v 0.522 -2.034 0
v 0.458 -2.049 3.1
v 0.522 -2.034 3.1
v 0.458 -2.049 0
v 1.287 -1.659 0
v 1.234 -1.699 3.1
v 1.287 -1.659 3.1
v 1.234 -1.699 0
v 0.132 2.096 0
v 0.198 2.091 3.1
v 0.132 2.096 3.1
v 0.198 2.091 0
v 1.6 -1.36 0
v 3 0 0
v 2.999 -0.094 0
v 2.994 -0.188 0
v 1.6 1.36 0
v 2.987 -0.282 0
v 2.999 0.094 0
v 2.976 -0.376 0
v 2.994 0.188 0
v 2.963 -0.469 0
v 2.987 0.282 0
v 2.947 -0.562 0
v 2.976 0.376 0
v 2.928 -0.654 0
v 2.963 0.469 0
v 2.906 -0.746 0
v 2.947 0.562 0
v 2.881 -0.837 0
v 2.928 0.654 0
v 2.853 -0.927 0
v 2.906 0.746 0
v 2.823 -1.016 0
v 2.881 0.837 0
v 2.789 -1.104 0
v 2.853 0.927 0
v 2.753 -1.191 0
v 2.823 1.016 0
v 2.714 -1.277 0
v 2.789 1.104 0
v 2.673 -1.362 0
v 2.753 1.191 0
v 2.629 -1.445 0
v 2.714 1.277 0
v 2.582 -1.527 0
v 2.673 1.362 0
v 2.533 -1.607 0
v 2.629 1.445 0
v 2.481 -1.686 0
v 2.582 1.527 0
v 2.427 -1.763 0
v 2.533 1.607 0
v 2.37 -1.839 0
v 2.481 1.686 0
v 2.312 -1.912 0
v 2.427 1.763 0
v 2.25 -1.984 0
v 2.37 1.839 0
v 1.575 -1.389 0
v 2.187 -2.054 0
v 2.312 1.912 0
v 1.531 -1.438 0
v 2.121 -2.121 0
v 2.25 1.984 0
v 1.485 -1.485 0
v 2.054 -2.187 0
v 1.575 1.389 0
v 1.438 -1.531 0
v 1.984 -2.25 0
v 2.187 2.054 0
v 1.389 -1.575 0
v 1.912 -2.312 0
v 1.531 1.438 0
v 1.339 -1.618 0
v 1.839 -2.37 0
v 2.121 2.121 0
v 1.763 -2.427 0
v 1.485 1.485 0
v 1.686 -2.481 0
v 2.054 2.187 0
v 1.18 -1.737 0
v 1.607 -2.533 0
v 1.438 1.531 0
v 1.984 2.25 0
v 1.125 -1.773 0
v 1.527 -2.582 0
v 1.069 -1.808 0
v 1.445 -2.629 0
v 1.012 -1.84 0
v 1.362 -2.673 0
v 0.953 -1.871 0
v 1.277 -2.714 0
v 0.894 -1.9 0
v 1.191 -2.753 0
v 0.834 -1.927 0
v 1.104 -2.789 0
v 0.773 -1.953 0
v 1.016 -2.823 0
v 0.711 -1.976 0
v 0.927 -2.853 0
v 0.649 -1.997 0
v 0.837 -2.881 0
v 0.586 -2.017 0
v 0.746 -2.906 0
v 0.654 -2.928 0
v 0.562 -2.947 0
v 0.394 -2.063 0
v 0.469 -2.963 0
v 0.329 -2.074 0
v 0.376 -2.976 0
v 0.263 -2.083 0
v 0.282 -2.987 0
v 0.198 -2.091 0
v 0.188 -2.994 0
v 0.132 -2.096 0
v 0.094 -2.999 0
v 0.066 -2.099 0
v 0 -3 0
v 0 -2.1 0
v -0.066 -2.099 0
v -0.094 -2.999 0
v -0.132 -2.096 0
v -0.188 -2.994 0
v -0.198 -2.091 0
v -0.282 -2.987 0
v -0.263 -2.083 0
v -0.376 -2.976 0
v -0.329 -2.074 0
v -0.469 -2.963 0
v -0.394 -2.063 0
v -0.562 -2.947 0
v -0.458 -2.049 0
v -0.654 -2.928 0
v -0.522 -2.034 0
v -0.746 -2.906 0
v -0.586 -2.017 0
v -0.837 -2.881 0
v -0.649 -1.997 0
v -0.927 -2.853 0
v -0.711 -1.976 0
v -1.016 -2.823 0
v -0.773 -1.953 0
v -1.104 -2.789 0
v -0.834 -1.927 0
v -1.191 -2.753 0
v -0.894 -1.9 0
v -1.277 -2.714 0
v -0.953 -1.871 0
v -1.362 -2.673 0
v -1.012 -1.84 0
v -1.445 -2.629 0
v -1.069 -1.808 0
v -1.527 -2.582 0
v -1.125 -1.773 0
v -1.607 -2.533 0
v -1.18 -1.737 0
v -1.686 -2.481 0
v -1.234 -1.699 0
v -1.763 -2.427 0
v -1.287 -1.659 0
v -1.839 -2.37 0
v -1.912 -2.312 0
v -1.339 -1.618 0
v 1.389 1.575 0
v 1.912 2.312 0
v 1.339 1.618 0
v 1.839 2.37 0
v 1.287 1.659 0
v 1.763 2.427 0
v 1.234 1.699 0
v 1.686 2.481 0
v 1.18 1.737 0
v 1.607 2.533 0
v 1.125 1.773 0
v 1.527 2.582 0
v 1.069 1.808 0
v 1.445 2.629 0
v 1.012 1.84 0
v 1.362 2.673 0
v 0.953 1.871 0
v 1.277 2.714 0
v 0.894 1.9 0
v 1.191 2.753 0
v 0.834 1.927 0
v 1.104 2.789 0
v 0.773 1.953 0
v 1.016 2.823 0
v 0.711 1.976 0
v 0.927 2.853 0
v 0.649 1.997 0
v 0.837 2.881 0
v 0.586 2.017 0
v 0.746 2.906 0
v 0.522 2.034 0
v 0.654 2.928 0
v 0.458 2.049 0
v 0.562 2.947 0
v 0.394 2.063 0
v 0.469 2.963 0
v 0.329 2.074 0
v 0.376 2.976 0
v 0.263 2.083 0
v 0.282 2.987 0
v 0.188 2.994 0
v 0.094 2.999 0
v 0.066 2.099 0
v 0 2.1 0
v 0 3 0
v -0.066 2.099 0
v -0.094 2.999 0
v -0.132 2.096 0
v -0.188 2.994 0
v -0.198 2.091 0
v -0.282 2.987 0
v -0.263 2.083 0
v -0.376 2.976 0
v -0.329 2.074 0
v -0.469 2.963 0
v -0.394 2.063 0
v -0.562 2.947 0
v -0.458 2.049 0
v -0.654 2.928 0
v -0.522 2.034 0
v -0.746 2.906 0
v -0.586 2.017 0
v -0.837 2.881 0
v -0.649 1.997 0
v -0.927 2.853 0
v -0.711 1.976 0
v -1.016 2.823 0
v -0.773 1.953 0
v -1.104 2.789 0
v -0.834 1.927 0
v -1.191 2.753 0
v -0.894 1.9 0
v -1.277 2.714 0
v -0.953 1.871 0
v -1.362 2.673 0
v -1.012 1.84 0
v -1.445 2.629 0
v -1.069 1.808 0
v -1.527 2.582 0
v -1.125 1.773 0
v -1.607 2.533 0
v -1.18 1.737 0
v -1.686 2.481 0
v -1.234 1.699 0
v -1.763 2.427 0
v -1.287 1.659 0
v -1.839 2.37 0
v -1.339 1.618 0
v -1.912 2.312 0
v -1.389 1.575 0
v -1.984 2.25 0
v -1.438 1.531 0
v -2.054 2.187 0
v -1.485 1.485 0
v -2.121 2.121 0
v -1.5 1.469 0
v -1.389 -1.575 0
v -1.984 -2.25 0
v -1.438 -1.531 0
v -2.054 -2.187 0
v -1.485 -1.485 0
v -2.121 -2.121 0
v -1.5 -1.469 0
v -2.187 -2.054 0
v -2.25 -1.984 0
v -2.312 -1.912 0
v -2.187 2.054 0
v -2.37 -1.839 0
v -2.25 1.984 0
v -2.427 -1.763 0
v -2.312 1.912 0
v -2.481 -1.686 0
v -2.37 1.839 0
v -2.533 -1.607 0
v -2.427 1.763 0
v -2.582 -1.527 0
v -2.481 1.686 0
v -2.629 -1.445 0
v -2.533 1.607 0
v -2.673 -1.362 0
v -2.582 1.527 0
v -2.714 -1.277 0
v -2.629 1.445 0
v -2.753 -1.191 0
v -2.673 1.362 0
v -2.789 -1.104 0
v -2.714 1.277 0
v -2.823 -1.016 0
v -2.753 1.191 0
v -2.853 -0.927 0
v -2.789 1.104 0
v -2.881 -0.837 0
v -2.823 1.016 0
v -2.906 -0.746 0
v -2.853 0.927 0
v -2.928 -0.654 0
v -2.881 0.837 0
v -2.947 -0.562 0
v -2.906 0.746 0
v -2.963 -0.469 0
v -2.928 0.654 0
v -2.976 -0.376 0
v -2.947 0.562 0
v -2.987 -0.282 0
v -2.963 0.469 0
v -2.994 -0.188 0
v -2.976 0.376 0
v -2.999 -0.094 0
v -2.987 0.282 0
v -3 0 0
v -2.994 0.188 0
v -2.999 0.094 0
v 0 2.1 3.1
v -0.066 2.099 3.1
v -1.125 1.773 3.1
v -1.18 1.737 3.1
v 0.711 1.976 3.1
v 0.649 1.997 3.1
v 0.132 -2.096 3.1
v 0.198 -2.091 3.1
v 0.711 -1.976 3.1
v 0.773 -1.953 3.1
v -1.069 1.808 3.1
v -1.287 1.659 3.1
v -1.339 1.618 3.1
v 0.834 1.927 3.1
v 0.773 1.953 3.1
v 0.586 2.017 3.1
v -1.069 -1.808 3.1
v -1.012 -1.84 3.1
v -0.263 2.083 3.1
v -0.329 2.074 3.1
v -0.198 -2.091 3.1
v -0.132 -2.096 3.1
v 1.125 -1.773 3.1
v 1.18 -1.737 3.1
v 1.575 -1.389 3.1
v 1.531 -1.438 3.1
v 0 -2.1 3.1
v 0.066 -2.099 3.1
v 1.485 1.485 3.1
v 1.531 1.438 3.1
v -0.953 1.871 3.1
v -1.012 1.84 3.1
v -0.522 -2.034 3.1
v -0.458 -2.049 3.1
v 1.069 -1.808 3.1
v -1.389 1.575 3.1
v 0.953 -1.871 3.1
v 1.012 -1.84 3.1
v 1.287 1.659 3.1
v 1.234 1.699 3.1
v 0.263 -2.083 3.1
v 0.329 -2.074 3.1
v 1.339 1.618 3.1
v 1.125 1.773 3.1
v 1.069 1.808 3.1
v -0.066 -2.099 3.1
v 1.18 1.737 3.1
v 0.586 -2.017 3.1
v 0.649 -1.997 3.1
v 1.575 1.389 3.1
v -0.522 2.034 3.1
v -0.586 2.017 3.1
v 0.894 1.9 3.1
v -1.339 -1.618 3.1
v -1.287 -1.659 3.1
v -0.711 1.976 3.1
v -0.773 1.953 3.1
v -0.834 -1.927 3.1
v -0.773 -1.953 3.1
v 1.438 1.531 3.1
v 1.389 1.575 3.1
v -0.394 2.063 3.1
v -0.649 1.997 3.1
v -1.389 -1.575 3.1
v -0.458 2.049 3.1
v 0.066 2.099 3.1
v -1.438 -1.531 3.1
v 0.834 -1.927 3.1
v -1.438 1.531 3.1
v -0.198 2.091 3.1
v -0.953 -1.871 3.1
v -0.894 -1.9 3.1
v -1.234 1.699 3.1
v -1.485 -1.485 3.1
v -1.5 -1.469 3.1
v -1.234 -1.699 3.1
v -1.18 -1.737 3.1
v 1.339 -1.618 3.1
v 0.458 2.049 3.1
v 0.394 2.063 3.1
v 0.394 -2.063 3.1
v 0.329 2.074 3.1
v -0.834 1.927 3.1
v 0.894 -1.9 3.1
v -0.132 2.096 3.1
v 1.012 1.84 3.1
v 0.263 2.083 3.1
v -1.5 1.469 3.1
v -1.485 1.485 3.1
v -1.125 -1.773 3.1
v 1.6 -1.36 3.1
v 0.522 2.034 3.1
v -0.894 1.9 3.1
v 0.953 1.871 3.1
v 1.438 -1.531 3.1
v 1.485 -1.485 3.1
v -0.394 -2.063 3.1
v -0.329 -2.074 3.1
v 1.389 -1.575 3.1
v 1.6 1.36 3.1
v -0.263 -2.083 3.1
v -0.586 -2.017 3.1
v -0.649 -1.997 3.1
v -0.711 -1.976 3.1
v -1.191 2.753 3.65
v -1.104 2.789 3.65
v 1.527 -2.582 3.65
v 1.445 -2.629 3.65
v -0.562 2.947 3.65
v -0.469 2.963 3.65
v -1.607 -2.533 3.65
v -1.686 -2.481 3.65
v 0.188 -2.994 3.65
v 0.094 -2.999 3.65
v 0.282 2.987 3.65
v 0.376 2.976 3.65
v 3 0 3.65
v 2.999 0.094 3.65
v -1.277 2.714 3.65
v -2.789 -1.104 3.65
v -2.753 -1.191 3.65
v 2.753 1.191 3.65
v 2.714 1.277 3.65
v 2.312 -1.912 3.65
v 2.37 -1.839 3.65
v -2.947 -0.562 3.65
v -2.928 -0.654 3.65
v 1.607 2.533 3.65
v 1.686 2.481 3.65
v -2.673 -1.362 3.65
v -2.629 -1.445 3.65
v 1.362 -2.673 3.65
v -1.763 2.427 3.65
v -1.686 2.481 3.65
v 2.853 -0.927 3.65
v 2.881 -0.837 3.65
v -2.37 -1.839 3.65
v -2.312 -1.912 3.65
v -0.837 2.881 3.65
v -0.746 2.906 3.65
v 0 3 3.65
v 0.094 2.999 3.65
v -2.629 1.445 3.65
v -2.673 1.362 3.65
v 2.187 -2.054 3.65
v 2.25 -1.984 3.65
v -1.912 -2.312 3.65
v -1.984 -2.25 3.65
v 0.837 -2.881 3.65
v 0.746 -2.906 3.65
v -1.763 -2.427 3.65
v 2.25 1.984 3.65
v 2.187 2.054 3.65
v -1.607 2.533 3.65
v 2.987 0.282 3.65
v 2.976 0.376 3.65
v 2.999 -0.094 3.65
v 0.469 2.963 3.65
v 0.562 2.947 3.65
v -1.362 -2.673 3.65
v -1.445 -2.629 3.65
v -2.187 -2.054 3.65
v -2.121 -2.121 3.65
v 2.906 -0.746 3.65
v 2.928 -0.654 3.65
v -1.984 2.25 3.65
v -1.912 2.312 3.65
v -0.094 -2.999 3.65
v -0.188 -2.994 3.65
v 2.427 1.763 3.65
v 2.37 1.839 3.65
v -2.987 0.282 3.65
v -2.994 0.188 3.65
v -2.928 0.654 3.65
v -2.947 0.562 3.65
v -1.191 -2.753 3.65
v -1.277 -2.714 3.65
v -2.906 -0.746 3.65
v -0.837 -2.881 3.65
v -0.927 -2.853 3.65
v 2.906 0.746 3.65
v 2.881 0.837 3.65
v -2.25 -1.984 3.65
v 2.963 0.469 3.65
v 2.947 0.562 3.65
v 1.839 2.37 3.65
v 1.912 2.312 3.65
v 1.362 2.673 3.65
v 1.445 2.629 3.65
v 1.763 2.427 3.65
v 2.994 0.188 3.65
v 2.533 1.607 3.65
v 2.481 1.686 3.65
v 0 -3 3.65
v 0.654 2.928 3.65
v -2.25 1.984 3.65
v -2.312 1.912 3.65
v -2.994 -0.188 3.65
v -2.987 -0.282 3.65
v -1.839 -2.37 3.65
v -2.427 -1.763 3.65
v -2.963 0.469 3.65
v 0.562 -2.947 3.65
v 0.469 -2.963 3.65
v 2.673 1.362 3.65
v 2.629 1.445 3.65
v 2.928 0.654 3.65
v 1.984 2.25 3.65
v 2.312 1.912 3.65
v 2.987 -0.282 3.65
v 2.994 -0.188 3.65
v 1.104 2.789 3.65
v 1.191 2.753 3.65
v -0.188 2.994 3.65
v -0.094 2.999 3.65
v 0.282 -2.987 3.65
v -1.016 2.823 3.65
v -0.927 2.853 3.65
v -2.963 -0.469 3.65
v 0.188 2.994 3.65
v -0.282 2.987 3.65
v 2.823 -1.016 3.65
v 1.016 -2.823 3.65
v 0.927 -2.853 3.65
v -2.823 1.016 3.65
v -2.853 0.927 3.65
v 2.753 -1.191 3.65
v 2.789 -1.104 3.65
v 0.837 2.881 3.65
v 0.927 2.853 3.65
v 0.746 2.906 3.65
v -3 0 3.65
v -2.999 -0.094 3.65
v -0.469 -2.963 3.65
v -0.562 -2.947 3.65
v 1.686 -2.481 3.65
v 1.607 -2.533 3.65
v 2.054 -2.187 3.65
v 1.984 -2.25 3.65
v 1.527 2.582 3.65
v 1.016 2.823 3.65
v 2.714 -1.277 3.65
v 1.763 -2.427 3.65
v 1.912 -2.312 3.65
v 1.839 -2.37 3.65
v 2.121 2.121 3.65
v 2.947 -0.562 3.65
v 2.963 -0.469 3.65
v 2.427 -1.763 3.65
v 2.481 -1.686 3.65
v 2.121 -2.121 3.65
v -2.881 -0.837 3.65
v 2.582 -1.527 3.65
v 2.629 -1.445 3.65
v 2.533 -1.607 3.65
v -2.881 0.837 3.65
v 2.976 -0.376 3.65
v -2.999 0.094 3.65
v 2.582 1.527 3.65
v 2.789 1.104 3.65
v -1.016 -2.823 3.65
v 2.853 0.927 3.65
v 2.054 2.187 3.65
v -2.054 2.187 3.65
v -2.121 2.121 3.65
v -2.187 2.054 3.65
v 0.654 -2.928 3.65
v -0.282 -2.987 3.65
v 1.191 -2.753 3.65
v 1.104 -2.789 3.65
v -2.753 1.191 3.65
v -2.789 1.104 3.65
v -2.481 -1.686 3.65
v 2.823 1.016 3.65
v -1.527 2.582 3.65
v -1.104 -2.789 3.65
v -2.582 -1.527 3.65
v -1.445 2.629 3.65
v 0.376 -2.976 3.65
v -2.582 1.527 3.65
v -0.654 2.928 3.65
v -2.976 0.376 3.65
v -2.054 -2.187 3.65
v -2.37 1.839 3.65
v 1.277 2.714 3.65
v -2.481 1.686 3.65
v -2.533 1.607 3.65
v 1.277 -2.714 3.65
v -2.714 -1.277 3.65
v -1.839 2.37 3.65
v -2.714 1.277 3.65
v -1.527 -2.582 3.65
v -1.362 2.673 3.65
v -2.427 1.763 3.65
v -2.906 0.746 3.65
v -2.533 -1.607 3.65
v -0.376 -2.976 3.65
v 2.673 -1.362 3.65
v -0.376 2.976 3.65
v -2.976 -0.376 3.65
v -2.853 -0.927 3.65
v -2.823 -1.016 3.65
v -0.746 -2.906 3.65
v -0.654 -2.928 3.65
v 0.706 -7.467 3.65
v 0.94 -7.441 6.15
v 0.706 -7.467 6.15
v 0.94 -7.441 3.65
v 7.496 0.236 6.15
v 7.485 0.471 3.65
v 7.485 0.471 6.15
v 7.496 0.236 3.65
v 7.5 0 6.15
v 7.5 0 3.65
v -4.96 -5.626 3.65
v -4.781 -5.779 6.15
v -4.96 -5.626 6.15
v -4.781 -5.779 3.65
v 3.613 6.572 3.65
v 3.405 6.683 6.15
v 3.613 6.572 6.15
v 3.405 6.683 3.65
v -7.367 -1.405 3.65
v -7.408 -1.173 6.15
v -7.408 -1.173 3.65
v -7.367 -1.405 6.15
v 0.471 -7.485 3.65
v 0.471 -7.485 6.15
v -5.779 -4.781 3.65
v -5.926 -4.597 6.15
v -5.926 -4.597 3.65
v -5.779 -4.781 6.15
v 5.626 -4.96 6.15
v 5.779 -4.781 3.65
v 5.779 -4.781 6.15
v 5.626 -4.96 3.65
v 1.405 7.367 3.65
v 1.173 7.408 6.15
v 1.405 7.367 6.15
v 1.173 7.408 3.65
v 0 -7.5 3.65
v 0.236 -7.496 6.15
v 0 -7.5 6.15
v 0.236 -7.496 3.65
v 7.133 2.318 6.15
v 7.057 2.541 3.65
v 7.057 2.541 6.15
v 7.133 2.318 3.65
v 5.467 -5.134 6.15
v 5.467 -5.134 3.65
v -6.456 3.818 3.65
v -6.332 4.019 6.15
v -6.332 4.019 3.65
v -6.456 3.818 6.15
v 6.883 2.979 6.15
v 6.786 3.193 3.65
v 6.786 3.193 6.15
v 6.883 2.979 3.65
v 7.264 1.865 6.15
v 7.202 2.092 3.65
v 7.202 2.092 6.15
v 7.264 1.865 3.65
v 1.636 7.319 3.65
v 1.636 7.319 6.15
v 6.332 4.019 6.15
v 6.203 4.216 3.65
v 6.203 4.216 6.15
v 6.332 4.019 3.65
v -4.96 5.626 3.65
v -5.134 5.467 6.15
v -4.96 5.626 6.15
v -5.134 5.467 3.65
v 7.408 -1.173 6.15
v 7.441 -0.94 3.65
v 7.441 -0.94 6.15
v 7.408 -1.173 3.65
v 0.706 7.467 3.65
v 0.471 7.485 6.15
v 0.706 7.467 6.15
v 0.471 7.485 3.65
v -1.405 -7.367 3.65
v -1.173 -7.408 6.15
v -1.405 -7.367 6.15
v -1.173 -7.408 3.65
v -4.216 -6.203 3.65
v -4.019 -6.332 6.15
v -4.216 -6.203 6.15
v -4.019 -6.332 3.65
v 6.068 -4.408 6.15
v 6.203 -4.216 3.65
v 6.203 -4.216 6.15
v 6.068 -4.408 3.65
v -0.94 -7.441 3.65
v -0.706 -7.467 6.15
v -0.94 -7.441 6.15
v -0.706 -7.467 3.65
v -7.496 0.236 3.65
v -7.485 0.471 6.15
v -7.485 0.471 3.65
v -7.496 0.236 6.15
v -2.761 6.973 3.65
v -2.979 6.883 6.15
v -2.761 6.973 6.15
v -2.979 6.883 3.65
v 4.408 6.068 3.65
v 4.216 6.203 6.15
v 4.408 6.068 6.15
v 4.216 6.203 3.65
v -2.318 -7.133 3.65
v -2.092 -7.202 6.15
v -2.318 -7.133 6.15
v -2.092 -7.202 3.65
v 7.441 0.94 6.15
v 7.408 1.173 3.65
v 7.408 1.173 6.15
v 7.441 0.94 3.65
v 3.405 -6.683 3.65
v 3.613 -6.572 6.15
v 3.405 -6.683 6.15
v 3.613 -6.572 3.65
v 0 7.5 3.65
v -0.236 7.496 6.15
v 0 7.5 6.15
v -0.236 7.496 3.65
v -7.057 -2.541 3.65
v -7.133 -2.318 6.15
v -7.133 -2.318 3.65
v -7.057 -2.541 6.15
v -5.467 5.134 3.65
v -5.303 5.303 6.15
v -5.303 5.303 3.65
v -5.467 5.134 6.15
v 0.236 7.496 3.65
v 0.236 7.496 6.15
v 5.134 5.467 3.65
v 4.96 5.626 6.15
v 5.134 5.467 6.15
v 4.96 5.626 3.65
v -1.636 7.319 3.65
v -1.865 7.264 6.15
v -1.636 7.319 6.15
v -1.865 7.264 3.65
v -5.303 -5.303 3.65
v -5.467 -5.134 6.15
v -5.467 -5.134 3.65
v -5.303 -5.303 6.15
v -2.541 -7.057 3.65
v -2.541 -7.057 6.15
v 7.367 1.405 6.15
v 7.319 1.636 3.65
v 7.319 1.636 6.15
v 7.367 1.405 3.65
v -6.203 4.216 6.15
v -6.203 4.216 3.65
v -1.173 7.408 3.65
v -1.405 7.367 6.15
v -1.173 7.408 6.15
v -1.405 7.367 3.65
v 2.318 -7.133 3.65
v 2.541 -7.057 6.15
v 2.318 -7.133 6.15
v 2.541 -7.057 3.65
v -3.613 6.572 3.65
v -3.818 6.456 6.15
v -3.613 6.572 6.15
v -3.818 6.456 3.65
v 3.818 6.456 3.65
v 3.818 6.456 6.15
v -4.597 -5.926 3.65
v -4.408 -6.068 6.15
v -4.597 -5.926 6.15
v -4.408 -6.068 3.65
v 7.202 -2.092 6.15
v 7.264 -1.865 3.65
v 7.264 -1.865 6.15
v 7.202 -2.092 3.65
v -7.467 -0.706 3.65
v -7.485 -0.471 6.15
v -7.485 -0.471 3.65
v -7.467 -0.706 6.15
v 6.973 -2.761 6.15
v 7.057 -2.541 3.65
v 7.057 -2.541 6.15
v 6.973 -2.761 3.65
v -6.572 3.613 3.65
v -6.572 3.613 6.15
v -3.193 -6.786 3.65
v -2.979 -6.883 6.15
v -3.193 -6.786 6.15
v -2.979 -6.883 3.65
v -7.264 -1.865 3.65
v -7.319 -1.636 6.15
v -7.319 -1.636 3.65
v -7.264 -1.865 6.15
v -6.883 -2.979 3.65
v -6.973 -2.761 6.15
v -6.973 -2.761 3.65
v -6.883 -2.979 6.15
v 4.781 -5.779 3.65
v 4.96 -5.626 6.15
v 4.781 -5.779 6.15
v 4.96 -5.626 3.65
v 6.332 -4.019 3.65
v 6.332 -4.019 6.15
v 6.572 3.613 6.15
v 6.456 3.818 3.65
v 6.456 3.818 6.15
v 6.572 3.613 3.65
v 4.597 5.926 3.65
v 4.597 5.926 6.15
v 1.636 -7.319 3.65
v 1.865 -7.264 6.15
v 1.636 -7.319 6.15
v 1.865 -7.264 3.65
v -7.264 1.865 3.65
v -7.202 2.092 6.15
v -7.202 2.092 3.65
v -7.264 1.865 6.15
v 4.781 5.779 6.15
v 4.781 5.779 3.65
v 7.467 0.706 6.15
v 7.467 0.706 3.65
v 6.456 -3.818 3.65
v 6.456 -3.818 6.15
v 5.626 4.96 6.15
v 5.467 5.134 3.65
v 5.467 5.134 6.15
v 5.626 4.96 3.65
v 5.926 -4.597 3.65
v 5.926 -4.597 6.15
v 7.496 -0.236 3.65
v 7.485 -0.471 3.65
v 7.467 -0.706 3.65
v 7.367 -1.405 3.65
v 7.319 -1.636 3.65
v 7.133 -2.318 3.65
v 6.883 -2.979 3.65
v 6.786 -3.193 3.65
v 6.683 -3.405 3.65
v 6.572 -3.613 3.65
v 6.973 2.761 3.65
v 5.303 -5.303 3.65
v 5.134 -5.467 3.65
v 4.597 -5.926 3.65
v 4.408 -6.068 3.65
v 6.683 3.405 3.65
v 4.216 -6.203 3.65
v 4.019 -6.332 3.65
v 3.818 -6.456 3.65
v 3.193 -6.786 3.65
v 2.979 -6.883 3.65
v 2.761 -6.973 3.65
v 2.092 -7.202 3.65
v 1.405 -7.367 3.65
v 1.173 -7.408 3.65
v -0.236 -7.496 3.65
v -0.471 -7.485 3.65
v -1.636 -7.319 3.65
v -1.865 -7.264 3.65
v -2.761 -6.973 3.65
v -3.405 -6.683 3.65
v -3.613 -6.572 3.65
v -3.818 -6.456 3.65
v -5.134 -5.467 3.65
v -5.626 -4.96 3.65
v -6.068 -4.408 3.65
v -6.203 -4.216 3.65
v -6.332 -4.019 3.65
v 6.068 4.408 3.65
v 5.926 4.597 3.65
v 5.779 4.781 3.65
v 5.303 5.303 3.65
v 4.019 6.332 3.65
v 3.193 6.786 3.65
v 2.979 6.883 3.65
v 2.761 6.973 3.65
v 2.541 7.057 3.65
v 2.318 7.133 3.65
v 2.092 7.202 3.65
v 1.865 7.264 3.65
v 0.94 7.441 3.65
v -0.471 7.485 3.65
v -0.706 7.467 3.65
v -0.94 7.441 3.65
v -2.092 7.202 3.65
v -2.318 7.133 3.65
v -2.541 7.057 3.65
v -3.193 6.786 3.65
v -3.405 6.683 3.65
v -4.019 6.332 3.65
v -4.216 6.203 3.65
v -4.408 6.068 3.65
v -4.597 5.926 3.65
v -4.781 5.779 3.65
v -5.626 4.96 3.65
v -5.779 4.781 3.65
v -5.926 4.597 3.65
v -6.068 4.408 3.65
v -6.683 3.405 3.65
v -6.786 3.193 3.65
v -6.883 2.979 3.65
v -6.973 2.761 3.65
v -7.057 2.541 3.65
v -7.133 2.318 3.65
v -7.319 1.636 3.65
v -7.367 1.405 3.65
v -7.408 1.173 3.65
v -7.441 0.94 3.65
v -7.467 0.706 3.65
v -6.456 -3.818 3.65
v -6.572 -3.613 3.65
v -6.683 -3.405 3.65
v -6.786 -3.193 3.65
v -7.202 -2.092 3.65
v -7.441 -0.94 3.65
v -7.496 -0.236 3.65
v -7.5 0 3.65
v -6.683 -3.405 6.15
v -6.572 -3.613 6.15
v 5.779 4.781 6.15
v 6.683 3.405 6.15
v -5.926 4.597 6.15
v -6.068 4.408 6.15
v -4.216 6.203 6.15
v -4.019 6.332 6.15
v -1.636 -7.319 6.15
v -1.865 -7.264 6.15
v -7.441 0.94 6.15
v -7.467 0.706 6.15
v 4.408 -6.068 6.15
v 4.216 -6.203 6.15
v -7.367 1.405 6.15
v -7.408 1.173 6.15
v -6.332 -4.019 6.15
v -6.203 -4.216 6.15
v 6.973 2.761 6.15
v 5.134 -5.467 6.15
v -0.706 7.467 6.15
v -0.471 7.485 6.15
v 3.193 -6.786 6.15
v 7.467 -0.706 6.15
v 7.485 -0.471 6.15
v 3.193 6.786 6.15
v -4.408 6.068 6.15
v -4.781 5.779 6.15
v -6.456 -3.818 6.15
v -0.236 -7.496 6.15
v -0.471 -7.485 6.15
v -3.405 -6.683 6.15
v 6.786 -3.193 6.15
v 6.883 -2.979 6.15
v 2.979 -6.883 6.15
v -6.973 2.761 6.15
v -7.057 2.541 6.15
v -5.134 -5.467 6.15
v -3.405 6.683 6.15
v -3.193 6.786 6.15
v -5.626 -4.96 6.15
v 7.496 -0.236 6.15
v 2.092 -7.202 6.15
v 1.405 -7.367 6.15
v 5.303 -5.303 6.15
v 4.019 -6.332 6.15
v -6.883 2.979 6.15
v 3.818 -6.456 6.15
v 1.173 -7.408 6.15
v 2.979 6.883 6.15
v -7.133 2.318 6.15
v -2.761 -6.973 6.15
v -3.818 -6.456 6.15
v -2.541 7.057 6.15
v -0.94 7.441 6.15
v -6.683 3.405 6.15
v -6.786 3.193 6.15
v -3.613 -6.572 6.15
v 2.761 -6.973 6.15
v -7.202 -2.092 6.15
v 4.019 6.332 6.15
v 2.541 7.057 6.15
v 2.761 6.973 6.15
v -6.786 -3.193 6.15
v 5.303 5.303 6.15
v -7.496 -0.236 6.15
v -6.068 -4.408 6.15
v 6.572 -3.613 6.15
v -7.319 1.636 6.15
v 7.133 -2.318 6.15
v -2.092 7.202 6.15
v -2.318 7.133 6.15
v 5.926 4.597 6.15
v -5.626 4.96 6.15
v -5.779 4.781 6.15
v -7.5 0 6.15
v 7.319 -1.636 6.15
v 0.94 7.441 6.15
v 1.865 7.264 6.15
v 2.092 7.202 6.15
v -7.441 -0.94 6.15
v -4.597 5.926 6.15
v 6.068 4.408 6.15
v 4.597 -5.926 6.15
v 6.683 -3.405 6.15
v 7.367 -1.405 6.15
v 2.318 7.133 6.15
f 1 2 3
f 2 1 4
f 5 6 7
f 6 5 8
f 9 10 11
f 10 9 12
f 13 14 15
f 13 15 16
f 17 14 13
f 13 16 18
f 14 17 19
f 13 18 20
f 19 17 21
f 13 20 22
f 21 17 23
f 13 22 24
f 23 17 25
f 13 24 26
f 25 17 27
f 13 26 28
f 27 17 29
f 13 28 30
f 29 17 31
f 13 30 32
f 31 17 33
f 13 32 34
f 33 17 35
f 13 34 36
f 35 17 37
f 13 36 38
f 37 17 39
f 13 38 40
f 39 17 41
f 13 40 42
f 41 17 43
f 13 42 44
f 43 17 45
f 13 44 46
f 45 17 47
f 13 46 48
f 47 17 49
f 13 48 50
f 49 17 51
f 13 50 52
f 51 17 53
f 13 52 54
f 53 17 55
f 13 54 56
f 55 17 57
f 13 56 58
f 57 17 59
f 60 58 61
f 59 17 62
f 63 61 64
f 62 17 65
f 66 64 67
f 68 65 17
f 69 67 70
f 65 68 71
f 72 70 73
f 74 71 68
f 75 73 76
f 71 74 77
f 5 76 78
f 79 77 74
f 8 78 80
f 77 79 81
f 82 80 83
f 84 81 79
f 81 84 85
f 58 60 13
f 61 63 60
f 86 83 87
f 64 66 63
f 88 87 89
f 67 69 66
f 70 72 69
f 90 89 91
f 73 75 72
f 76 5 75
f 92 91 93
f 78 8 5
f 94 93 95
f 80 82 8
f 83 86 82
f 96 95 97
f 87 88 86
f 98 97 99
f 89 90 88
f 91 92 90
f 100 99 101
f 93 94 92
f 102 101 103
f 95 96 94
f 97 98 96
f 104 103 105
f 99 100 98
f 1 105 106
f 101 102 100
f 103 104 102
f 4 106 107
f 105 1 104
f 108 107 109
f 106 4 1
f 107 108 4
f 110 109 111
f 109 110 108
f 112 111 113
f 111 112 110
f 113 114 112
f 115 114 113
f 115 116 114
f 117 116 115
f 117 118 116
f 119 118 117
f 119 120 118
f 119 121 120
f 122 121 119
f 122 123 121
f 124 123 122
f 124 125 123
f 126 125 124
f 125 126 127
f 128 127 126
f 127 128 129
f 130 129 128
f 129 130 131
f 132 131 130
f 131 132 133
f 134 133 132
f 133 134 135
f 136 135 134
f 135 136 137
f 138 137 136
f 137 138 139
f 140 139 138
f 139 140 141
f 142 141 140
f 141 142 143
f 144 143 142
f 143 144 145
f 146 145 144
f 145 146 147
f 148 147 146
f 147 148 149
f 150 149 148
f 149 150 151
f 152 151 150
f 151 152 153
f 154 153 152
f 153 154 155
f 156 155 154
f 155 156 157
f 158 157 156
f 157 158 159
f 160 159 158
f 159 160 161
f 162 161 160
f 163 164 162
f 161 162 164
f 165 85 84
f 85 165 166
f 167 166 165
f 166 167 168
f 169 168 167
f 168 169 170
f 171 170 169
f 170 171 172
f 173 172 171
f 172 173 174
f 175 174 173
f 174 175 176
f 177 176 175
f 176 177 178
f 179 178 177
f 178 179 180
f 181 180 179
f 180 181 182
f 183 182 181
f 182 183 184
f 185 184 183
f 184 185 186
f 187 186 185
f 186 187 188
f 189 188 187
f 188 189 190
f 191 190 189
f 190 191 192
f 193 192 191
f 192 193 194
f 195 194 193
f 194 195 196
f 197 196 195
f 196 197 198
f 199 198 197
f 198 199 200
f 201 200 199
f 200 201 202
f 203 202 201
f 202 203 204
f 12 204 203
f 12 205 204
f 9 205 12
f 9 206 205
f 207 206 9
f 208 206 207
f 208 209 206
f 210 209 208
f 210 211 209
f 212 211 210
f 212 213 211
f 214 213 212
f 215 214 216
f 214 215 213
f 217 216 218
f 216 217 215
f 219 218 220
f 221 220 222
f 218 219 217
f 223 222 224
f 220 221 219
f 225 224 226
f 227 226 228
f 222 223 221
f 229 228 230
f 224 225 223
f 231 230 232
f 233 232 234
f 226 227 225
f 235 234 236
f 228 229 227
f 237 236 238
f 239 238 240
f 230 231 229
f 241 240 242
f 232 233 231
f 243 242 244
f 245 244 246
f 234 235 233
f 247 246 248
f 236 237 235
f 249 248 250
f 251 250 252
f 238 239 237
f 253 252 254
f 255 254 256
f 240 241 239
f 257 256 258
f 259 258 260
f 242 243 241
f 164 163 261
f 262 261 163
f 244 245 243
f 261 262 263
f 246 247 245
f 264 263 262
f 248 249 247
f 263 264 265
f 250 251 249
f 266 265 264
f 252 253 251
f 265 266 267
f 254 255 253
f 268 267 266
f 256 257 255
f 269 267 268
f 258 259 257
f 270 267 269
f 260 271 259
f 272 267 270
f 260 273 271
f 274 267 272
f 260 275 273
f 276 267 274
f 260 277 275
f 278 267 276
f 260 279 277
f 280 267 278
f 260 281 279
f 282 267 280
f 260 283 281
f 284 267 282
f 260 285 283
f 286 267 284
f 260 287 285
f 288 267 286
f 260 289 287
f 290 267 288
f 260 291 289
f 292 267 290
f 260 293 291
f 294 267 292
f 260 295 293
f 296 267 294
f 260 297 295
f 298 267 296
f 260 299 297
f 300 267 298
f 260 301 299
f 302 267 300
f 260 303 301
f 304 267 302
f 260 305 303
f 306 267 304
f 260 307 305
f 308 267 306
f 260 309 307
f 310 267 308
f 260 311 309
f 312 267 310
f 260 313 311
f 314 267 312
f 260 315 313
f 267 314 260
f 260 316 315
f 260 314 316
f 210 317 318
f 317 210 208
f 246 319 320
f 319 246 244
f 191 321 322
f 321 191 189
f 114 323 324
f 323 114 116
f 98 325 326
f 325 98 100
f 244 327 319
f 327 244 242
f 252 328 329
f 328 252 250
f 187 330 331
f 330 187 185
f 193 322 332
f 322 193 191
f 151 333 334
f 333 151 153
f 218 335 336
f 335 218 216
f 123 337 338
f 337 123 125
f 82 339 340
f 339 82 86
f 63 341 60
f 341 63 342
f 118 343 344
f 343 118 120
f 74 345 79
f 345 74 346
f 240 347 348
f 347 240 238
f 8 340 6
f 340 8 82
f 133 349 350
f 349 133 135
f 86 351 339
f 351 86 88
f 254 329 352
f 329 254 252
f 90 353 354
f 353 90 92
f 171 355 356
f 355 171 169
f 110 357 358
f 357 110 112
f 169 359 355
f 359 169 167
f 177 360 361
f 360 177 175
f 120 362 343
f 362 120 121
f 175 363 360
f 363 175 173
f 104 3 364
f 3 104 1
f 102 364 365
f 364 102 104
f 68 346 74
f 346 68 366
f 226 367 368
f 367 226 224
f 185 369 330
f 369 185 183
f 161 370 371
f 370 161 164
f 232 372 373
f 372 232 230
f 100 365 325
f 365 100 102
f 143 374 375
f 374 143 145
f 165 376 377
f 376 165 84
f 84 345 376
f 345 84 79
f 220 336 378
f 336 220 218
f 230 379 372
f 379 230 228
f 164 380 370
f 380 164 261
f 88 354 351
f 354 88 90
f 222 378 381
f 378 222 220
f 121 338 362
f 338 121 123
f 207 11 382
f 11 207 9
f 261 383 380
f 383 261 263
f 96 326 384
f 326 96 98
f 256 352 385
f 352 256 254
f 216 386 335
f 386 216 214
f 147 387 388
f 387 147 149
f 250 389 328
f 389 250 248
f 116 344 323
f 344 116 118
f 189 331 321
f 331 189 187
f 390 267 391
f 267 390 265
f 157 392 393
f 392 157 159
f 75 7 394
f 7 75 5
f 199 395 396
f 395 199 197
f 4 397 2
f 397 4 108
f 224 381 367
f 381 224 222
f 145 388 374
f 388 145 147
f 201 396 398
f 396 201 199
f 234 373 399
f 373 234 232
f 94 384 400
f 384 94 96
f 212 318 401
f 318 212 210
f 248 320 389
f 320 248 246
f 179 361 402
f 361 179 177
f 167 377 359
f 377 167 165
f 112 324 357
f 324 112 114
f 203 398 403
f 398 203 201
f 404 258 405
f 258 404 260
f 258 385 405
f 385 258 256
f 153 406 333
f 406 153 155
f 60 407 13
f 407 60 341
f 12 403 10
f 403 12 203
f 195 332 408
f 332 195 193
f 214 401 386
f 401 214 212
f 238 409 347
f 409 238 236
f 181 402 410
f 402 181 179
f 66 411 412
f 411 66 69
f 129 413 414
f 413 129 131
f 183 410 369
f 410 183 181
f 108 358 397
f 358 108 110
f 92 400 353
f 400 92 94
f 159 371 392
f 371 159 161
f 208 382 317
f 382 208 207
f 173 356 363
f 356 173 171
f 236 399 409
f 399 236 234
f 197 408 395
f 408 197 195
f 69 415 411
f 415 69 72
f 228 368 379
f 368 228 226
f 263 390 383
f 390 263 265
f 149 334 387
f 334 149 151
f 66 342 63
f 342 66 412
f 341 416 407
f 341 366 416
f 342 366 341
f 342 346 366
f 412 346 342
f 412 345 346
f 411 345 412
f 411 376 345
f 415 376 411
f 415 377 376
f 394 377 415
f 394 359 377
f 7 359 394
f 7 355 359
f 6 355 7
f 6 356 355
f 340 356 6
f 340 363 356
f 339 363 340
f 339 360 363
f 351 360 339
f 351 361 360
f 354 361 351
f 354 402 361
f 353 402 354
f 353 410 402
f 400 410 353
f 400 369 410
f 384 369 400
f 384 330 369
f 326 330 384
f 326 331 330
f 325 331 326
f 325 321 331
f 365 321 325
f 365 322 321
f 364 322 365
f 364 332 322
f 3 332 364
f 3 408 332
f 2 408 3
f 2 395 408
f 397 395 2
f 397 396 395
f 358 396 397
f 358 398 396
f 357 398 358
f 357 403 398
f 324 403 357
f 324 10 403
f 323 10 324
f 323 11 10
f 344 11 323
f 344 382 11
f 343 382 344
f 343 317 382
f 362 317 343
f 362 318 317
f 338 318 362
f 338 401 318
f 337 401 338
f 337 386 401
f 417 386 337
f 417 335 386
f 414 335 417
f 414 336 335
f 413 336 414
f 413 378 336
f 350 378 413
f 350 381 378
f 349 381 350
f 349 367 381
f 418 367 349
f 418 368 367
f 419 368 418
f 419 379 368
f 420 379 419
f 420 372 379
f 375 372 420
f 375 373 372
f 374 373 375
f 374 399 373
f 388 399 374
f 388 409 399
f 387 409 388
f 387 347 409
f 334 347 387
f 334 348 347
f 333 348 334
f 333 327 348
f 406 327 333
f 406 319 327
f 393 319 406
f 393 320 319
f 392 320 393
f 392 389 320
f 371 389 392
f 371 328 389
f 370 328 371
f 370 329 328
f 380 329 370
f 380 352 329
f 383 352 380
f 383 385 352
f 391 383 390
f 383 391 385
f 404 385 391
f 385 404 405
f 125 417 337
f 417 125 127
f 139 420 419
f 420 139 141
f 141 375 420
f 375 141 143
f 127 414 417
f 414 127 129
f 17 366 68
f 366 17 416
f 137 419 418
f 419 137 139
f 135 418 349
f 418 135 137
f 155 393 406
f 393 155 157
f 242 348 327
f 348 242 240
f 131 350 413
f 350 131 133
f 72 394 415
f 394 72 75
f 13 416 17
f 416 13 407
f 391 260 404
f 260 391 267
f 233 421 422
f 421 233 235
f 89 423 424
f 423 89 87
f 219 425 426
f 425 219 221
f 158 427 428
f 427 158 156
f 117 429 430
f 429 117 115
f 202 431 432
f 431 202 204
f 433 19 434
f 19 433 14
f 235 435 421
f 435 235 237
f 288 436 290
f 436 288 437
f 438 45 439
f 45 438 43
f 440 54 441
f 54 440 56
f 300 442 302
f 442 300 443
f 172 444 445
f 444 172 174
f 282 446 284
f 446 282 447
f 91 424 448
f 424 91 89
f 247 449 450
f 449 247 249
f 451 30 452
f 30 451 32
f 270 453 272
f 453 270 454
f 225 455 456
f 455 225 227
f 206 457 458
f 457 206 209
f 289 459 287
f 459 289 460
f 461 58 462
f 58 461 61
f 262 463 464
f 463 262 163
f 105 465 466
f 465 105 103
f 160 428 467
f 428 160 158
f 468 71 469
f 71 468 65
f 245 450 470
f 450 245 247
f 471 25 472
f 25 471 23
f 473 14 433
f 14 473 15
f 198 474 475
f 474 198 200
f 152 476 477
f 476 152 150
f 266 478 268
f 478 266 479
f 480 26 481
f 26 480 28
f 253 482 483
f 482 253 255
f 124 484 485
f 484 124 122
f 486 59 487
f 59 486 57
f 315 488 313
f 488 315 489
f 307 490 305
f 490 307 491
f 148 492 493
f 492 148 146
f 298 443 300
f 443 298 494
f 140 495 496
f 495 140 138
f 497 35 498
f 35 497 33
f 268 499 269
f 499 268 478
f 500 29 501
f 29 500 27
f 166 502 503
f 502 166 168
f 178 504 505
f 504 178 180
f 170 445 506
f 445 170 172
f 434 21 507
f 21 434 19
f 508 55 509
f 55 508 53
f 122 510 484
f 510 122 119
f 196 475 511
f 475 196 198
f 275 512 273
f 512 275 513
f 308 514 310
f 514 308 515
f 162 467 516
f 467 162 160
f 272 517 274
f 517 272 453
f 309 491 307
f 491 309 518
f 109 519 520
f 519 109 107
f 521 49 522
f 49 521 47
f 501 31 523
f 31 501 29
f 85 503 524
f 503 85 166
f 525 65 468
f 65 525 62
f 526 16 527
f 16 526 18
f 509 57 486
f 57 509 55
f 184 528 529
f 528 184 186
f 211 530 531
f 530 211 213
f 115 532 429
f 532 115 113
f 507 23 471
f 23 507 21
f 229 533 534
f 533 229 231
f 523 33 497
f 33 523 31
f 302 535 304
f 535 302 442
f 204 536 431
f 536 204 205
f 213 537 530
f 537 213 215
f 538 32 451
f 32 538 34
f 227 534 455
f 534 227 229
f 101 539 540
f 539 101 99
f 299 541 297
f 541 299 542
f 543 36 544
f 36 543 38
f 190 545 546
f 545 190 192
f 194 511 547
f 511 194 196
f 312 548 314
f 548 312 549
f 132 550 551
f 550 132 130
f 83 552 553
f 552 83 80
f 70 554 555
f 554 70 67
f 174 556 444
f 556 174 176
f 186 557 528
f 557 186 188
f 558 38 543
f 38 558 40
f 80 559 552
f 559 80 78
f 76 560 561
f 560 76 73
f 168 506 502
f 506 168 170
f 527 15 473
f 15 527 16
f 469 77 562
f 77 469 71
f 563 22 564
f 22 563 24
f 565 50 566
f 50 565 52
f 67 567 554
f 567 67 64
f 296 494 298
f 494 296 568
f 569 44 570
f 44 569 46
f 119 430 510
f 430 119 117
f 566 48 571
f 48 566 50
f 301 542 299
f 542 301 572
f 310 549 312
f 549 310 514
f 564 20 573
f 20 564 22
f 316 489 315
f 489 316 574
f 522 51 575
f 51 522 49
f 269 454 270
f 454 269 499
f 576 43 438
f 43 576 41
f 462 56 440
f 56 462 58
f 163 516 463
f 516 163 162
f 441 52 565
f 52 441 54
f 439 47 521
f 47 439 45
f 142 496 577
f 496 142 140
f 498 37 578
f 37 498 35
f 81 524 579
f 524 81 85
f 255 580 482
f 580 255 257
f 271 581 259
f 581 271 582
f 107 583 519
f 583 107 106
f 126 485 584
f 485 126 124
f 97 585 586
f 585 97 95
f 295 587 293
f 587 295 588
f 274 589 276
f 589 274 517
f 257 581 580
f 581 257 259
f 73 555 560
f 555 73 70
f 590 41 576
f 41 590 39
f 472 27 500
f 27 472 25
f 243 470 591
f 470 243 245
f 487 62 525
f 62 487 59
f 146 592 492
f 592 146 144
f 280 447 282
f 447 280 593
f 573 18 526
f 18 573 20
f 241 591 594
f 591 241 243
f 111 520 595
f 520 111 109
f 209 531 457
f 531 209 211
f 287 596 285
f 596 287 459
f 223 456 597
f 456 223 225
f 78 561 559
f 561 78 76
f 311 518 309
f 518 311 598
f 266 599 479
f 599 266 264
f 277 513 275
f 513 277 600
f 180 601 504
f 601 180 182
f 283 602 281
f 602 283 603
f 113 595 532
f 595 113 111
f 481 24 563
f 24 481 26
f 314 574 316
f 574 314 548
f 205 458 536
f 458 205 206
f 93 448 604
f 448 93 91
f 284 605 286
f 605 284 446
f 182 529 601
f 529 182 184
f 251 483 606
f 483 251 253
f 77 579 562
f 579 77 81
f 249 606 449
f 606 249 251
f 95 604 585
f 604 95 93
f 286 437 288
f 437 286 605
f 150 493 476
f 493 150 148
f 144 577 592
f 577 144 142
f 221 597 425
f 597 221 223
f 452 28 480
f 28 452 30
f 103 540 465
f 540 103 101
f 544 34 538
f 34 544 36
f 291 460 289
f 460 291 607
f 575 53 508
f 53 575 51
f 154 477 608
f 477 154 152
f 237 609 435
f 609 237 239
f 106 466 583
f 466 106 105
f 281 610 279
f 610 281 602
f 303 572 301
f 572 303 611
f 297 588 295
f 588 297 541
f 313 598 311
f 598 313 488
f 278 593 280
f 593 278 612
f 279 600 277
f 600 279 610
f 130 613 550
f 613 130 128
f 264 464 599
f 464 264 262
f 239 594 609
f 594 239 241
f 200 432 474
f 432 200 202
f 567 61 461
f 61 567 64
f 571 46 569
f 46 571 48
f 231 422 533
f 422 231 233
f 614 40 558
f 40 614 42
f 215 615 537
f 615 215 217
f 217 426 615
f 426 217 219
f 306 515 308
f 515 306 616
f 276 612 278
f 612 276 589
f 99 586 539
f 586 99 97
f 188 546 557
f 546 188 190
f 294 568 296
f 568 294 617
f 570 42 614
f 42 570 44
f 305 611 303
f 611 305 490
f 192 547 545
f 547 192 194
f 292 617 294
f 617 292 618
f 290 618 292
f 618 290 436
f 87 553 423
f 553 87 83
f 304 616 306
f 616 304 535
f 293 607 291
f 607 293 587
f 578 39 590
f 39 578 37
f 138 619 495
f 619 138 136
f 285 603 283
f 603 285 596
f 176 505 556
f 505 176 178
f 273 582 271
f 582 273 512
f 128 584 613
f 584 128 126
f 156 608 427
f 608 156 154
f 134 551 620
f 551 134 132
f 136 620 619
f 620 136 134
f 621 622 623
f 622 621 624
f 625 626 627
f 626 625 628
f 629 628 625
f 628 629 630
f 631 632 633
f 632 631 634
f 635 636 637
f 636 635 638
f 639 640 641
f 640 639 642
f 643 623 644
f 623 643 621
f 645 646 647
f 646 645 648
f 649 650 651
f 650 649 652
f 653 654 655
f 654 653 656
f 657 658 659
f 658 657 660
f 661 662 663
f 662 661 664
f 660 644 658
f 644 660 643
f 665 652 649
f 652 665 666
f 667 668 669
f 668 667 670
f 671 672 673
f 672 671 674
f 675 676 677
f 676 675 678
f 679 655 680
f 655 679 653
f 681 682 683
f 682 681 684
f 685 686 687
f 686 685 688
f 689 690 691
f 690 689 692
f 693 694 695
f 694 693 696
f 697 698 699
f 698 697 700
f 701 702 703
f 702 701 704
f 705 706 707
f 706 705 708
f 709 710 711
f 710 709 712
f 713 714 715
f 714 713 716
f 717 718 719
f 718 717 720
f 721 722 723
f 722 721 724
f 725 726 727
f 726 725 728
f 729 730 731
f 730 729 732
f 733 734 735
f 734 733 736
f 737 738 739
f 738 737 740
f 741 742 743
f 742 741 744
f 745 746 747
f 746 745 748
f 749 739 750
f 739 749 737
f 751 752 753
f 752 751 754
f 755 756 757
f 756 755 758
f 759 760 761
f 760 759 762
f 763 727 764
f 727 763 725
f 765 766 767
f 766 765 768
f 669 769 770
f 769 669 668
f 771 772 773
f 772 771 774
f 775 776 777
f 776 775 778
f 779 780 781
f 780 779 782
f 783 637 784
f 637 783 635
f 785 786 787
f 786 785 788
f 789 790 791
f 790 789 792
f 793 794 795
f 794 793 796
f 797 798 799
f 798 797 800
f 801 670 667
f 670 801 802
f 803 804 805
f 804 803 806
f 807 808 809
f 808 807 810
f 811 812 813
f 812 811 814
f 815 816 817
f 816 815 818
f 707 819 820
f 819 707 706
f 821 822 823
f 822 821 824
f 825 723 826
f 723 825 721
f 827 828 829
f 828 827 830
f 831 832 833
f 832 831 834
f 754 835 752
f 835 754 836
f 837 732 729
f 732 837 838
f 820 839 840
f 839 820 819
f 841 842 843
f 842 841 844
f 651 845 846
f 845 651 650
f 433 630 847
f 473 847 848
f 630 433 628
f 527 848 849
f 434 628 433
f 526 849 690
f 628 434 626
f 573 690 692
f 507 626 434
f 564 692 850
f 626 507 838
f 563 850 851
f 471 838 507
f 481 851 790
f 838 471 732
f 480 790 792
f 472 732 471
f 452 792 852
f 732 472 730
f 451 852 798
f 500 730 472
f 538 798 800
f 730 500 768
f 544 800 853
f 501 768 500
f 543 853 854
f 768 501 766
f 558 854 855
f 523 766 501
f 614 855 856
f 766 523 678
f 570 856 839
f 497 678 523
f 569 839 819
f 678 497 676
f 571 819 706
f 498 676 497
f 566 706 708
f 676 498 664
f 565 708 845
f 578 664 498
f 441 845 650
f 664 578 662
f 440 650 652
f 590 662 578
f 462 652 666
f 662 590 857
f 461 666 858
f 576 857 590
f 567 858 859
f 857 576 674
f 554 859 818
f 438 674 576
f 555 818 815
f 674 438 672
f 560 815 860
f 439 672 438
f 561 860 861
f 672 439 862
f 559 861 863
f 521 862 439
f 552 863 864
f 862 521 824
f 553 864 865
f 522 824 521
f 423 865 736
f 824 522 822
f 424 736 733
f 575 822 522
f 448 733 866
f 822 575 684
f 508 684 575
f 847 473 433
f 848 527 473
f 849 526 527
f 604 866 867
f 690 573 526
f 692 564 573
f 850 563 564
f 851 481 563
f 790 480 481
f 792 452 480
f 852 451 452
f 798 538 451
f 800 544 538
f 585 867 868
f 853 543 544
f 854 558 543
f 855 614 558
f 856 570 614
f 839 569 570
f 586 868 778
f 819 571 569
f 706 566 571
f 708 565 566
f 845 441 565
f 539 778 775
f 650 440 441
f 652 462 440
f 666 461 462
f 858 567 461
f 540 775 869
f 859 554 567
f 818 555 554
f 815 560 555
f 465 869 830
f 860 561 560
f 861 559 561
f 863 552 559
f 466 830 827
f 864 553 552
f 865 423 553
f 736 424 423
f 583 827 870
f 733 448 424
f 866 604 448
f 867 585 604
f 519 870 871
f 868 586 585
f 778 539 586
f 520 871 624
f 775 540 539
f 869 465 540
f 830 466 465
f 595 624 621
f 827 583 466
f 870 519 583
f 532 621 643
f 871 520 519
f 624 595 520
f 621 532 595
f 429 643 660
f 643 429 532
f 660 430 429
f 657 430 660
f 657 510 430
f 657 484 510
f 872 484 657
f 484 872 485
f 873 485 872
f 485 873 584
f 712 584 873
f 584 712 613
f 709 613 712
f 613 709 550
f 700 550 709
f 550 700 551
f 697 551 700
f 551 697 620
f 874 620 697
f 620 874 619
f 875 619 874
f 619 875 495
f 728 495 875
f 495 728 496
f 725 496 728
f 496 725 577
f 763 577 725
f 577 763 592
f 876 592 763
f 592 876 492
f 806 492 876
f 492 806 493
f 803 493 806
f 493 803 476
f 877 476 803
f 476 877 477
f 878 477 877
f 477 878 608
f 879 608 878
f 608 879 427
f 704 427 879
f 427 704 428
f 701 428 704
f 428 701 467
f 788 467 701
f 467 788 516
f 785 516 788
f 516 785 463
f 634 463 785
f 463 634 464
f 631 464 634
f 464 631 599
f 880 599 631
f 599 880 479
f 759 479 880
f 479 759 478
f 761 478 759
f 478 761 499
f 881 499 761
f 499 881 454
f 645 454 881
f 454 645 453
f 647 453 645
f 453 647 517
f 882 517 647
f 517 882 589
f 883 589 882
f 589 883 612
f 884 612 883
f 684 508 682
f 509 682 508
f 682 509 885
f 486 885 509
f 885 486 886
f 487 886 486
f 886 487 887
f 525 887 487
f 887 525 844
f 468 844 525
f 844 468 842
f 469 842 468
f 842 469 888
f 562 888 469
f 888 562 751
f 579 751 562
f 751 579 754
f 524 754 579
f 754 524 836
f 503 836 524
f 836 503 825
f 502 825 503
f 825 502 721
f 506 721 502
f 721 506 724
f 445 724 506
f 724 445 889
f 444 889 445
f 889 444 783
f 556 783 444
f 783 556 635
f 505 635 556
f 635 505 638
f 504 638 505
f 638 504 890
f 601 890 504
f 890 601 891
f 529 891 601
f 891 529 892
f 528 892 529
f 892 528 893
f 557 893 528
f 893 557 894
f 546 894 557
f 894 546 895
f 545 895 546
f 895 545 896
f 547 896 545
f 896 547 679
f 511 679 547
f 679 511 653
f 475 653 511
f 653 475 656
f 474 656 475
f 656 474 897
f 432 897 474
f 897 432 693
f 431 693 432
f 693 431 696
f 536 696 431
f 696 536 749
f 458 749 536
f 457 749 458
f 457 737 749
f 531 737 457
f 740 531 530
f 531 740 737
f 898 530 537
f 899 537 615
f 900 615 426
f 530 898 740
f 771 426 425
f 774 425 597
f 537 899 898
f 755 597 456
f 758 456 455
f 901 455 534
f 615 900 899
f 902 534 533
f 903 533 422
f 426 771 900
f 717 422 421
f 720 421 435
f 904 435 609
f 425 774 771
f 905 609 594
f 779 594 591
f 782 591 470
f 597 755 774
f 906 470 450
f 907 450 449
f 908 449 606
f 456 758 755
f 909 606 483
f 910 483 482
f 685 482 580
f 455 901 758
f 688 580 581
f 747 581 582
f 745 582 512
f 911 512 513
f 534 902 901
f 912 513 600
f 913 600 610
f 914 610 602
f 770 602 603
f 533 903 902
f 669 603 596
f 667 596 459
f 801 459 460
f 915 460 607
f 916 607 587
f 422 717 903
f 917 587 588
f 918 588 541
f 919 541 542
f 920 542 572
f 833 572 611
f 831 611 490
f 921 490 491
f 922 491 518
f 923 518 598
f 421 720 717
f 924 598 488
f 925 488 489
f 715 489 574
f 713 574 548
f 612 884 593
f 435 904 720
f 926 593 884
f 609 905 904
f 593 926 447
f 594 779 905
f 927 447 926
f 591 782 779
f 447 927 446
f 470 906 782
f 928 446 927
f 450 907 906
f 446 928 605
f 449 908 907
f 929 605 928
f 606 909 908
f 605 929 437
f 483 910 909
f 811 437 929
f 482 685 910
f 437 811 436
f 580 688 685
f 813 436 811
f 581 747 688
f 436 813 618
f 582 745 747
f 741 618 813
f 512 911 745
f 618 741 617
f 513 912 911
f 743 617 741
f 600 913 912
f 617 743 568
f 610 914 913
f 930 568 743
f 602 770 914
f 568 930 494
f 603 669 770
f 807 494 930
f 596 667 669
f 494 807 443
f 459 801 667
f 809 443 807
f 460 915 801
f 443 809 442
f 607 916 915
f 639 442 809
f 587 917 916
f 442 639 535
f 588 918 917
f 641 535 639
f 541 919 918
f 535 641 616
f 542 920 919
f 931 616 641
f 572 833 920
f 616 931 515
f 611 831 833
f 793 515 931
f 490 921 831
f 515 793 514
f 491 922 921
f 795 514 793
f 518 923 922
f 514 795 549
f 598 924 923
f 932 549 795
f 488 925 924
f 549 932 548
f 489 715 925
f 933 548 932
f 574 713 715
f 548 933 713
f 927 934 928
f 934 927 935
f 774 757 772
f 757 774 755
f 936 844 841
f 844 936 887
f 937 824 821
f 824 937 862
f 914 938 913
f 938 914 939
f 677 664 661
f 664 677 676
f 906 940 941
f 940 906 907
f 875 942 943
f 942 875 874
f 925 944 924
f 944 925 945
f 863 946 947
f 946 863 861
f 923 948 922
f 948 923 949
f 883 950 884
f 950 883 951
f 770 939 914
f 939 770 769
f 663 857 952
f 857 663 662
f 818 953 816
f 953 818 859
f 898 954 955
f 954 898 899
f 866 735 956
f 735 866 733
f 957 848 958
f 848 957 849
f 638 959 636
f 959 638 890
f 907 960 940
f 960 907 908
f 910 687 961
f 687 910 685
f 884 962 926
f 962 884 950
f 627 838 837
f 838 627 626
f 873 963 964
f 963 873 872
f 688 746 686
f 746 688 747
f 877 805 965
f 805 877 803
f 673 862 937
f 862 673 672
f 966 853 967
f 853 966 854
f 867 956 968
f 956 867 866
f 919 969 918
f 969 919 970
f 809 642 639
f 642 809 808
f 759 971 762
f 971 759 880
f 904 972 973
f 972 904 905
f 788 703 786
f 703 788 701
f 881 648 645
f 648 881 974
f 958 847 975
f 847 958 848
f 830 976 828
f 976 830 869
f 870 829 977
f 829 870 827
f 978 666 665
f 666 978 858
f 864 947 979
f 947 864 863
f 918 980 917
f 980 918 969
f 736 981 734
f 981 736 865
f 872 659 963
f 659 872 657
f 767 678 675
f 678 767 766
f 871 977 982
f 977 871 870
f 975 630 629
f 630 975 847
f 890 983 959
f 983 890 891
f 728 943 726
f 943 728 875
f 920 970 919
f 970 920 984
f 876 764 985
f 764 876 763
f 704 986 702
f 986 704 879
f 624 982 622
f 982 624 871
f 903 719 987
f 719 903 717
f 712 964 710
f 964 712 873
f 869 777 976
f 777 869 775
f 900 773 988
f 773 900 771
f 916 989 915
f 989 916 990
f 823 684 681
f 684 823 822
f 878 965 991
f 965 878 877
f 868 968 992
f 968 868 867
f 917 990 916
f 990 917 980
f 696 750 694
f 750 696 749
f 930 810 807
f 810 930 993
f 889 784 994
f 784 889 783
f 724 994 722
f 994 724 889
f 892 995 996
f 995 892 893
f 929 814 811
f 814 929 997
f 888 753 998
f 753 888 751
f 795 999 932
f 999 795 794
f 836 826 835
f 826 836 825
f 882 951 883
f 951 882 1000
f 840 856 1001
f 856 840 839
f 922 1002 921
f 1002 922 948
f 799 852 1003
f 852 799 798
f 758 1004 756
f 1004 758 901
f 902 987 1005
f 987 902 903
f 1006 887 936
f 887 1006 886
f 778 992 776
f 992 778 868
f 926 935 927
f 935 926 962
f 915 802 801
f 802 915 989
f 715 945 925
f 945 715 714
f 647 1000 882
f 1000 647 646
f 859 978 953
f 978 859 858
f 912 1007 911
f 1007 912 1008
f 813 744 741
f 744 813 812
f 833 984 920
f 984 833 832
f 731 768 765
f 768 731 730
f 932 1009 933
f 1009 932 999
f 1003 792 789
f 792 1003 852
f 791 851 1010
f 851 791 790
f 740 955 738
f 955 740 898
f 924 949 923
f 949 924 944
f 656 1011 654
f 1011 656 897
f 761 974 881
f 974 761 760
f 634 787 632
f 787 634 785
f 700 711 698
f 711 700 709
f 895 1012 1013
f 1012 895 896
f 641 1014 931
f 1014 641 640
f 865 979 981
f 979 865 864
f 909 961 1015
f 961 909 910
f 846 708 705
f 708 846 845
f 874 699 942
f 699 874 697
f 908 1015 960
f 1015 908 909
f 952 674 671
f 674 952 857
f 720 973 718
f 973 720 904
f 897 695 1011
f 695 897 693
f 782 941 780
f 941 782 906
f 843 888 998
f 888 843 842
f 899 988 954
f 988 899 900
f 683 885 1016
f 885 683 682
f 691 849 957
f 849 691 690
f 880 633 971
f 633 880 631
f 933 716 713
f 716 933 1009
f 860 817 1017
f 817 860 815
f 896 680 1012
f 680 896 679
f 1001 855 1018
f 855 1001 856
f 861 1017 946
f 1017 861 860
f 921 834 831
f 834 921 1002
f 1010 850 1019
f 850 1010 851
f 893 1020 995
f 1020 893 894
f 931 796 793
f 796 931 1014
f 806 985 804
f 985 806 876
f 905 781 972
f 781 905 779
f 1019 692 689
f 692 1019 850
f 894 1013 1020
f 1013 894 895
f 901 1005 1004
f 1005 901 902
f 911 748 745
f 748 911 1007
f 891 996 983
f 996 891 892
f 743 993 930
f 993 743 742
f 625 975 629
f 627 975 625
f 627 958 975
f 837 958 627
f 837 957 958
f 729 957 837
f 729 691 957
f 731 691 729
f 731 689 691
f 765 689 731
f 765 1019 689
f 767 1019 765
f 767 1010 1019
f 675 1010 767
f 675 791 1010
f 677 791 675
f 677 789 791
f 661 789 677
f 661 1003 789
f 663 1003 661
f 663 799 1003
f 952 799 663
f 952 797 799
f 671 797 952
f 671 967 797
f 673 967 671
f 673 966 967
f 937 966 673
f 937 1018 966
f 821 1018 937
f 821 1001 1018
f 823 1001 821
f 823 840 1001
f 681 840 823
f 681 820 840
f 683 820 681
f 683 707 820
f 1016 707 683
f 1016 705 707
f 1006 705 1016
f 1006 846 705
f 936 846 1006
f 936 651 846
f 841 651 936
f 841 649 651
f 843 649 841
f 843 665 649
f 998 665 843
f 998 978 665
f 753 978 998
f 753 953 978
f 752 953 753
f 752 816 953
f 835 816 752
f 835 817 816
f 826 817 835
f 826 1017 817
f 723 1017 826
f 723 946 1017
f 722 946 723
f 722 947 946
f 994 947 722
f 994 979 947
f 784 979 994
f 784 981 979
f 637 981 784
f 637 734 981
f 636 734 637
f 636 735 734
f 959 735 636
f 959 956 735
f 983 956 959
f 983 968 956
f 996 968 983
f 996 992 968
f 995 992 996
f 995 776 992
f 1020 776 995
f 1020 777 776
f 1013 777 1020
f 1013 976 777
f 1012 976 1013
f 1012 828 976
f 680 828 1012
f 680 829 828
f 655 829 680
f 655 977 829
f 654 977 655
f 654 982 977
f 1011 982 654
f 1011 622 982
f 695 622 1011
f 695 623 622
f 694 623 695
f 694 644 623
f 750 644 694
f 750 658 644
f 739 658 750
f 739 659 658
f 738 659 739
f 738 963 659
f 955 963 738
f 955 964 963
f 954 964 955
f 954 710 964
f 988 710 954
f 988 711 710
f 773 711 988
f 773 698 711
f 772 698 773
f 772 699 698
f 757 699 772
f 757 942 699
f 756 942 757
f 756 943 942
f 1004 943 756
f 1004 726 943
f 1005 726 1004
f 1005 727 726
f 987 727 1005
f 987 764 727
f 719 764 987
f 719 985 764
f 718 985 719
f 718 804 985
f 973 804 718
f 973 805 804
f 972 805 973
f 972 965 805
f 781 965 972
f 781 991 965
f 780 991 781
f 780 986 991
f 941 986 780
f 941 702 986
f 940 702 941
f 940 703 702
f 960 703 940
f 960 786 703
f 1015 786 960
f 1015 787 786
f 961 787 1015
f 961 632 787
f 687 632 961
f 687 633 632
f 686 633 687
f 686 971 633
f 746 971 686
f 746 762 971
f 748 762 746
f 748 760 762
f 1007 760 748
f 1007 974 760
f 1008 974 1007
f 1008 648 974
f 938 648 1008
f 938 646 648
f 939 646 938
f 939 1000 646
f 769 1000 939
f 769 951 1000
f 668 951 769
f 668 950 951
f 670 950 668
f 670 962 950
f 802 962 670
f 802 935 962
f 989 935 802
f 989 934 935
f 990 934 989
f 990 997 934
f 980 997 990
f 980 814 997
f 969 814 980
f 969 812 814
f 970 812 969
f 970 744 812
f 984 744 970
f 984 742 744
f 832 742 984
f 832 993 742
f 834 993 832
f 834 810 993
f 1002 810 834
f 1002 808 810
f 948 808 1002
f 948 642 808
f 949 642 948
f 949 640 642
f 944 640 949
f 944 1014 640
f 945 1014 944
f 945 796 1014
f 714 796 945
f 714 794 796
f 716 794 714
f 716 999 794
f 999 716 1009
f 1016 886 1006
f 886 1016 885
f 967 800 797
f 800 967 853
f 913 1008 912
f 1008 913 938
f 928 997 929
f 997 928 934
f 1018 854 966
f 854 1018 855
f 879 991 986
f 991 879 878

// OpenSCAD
$fn=200;

difference(){
    foot();
    hole();
}
translate([0,0,3.65]) hat();

module hat(){
    cylinder(2.5,7.5,7.5);
}

module foot(){
    cylinder(3.75,3,3);
}

module hole(){
    intersection(){
        cylinder(3.1,2.1,2.1);
        translate([-1.5,-2.5,0]) cube([3.1,5,3.1]);
    }
}
